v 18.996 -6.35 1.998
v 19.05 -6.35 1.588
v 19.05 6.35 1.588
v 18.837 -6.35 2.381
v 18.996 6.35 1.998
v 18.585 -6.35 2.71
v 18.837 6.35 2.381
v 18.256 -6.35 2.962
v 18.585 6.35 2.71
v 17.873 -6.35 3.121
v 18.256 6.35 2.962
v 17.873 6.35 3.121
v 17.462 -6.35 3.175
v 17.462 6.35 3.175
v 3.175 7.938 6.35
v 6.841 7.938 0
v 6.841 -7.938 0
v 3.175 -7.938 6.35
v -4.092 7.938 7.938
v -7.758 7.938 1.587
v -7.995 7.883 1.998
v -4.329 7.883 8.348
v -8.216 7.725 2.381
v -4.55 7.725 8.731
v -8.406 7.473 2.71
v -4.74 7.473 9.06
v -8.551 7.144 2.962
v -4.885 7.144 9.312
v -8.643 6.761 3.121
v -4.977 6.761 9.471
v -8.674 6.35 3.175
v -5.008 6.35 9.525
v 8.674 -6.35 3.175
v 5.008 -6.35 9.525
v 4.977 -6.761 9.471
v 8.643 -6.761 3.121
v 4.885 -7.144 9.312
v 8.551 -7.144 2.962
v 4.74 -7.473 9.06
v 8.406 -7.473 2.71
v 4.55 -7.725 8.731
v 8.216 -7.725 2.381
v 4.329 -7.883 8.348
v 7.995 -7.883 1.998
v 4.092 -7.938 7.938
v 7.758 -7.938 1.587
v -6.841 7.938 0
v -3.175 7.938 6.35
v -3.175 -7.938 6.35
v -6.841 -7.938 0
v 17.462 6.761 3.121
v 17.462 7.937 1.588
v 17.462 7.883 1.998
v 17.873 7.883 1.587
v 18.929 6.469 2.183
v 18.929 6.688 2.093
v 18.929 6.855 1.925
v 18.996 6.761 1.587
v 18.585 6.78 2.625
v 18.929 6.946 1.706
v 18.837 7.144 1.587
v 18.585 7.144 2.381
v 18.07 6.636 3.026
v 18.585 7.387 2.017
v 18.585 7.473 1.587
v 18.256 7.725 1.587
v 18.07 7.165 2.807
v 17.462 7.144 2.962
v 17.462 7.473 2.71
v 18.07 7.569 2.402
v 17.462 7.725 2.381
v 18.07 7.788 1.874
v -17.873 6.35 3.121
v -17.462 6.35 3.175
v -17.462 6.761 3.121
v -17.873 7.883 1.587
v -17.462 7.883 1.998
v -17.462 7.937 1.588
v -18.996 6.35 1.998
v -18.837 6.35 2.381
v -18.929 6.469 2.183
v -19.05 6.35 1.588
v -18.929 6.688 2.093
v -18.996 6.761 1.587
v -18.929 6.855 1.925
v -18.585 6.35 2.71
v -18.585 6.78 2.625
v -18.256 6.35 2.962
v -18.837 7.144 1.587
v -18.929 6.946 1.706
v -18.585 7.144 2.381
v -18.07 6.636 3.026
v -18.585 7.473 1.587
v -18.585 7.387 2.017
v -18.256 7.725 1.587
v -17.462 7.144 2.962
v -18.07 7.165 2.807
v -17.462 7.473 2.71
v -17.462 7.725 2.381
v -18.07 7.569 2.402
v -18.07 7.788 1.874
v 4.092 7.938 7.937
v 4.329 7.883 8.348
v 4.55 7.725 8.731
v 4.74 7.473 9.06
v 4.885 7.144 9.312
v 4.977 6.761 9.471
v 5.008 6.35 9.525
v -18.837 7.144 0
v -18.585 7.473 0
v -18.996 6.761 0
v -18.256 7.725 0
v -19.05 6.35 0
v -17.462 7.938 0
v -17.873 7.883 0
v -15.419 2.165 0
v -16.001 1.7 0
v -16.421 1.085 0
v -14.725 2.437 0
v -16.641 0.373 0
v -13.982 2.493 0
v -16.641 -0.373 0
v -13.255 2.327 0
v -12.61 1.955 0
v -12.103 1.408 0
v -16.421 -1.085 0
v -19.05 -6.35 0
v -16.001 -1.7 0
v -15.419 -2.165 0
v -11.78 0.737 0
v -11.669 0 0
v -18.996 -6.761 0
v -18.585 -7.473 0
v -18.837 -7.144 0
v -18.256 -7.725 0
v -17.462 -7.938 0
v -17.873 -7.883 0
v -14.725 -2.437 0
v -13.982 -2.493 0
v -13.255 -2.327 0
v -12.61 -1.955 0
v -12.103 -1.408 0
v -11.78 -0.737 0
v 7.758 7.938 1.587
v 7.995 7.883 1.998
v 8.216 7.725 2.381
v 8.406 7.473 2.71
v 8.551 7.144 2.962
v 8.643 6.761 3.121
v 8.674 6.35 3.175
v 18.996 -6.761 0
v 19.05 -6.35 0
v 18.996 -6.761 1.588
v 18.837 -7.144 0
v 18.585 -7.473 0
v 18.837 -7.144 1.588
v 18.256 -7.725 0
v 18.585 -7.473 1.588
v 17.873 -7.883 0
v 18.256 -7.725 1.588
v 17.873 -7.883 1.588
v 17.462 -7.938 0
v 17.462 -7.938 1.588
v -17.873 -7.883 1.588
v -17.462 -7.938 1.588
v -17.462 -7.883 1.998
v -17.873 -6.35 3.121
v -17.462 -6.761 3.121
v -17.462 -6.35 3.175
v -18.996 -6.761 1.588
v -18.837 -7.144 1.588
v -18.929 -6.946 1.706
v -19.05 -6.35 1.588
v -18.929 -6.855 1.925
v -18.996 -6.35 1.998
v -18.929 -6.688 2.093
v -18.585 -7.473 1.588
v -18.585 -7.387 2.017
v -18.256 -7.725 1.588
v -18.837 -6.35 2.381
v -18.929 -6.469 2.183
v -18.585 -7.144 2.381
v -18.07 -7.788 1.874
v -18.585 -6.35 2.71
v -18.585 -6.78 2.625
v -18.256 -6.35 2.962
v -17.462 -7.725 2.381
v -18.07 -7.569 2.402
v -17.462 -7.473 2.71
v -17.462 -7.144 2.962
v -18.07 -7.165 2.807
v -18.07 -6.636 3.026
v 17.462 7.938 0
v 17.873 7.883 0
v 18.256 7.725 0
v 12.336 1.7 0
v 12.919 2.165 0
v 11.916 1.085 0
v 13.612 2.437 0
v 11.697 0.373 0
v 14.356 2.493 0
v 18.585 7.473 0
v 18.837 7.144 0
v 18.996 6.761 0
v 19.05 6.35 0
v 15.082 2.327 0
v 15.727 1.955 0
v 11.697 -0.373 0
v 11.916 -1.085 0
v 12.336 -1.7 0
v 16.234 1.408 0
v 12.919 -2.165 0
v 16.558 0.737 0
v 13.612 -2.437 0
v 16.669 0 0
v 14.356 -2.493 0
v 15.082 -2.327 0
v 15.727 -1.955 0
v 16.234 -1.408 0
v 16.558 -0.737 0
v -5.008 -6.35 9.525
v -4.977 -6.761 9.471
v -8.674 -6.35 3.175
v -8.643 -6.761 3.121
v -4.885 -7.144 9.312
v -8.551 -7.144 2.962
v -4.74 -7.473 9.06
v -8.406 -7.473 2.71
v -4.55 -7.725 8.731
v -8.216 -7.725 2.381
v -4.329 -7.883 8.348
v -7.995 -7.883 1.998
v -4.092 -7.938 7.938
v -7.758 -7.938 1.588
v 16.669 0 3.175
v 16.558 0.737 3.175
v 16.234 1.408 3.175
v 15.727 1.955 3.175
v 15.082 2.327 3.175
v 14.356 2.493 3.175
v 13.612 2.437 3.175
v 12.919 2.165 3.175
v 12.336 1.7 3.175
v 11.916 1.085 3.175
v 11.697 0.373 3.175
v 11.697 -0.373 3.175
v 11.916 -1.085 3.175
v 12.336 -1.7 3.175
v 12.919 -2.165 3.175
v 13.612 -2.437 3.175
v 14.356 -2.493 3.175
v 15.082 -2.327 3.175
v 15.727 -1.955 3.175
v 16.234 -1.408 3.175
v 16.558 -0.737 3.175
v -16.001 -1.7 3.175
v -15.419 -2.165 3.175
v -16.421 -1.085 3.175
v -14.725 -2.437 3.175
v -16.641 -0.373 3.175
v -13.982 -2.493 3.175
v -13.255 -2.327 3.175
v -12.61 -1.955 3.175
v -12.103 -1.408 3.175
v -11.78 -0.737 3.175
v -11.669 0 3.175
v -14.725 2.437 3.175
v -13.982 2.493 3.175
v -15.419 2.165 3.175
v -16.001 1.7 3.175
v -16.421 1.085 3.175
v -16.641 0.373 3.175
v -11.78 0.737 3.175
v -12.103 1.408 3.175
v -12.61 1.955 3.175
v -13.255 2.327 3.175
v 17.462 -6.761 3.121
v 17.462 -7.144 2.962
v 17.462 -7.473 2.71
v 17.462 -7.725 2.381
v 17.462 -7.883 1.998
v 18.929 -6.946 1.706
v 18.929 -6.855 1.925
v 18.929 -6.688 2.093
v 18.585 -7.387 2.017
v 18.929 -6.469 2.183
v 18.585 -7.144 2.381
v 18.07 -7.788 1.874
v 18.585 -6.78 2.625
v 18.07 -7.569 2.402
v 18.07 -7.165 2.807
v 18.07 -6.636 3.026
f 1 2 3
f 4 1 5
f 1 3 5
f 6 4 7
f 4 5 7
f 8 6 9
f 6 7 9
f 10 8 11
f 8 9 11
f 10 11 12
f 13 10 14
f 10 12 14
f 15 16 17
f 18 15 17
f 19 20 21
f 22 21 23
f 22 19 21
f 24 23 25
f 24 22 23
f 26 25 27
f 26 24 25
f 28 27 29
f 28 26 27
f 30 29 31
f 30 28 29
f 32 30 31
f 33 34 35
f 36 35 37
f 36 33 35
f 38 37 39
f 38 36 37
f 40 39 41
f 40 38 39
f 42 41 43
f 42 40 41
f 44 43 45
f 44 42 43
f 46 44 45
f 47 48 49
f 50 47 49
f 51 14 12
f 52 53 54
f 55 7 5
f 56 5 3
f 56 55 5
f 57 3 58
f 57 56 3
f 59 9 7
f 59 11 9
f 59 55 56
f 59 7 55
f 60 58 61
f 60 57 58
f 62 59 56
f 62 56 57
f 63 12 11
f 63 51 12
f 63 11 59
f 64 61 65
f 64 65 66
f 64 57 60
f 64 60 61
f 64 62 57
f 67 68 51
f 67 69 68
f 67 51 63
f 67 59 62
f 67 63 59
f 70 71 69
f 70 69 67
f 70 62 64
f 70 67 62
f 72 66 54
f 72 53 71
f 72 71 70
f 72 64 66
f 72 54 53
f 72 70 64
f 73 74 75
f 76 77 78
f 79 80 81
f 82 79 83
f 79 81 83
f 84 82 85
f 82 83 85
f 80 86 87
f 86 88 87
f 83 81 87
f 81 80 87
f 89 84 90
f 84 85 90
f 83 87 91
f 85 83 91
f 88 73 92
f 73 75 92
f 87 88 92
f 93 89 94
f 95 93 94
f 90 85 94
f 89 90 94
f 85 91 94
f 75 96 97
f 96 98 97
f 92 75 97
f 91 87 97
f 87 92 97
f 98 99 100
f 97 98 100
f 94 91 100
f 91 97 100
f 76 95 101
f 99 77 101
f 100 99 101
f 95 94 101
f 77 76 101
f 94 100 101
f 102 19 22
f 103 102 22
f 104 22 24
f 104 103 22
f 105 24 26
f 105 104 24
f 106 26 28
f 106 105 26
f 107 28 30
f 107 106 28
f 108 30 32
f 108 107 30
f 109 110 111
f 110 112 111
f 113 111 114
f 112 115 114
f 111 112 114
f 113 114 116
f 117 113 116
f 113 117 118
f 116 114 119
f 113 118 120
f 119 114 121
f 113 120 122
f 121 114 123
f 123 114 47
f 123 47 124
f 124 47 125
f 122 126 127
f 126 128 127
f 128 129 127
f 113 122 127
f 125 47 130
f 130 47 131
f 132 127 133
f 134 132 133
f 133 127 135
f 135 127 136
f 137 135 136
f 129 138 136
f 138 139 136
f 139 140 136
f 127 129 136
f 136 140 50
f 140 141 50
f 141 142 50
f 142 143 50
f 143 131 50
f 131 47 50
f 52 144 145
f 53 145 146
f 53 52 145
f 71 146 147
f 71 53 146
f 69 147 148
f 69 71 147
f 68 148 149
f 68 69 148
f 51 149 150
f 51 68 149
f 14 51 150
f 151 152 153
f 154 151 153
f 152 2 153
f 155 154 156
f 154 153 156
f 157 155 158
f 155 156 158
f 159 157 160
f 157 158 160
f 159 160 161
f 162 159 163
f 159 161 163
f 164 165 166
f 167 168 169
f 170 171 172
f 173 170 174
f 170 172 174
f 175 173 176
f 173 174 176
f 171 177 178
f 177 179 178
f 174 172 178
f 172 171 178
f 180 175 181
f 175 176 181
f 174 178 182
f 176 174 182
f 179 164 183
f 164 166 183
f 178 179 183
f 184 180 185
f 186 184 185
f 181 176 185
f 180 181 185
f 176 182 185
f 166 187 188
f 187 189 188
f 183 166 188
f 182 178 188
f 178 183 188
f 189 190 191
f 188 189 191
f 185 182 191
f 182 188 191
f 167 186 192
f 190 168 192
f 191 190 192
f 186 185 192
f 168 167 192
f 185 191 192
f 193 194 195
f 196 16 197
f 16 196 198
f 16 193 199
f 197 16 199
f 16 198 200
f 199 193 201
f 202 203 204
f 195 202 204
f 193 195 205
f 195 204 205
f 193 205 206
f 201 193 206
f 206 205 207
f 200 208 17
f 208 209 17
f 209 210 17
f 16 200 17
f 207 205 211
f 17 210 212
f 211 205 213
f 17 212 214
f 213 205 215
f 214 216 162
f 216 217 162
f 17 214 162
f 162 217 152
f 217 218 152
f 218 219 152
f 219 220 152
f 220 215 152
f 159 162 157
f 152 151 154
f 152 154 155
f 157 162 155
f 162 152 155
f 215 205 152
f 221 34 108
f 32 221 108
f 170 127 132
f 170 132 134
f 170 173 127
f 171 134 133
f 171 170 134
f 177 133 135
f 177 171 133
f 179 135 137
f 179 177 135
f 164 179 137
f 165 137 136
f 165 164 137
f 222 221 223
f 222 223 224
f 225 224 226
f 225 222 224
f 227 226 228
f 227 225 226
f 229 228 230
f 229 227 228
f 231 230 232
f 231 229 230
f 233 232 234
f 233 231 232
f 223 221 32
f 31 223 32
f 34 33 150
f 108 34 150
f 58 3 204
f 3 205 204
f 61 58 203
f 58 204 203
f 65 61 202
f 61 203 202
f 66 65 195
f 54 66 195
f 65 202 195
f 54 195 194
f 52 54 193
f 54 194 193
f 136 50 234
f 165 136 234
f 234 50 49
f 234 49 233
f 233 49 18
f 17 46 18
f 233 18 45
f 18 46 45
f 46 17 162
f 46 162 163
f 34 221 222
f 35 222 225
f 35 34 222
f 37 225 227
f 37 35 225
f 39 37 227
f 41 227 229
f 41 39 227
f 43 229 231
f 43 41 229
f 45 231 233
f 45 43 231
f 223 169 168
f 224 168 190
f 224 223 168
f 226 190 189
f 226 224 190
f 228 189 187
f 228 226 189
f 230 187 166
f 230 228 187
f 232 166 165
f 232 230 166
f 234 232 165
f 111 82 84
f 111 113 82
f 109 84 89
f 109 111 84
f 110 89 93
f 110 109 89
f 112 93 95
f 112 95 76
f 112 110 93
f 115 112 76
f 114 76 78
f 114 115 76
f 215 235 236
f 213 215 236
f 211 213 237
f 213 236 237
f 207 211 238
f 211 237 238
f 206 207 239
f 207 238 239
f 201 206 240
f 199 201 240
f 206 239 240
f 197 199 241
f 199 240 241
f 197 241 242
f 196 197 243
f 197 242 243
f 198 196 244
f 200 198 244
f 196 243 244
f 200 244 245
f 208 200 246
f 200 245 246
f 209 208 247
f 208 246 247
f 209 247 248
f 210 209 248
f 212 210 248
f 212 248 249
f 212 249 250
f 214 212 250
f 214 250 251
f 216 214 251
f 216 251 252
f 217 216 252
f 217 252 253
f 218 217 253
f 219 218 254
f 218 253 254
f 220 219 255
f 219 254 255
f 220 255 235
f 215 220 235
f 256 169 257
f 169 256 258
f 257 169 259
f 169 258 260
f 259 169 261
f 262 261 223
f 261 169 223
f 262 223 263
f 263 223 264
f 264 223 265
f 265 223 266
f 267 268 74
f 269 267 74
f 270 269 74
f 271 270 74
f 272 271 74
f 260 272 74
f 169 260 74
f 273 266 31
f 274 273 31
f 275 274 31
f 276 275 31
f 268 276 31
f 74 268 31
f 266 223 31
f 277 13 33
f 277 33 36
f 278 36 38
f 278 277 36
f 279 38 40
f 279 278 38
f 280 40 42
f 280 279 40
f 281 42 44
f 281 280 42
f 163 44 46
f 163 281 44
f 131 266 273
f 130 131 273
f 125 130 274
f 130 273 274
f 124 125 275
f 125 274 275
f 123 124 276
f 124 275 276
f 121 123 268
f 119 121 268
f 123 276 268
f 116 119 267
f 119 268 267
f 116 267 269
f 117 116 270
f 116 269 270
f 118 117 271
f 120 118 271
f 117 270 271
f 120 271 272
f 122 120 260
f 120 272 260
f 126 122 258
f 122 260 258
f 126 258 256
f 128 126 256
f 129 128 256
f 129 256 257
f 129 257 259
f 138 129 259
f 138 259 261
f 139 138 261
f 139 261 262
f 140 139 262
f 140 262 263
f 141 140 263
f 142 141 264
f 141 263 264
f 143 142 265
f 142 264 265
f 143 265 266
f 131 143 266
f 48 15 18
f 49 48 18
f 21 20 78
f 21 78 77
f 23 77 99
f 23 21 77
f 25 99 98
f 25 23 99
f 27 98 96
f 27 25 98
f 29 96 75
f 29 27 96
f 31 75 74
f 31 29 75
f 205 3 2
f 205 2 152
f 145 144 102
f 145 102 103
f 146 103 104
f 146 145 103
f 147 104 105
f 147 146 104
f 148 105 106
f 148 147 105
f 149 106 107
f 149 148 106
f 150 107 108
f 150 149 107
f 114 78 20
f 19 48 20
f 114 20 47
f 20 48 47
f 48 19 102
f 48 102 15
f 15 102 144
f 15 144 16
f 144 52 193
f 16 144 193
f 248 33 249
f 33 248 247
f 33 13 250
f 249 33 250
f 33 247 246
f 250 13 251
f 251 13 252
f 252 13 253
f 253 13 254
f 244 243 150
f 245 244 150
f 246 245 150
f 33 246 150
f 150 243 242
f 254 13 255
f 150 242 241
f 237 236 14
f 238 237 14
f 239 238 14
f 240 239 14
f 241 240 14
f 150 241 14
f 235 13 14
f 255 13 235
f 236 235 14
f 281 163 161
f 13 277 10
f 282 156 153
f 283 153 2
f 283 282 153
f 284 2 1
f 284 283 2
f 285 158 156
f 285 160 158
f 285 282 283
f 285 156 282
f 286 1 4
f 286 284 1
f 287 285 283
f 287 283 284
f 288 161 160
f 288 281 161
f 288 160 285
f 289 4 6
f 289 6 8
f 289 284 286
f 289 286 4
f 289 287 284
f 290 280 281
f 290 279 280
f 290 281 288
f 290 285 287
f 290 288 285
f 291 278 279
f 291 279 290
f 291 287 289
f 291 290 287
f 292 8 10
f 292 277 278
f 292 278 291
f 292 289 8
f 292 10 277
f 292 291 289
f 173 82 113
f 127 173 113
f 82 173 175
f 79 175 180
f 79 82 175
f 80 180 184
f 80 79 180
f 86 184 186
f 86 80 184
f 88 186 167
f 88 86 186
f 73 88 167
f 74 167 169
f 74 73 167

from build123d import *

# Parameters (mm, degrees)
F4_R     = 2.5
F5_DEPTH = 3.175
F6_R     = 1.5875


with BuildPart() as f3:
    # F3: sweep along a path in F0
    with BuildLine(Plane.XZ) as f3_path:
        Line((-19.05, 0), (-6.8411742094, 0))
        Line((-6.8411742094, 0), (-3.175, 6.35))
        Line((-3.175, 6.35), (0, 6.35))
        Line((0, 6.35), (3.175, 6.35))
        Line((3.175, 6.35), (6.8411742094, 0))
        Line((6.8411742094, 0), (19.05, 0))
    # F2 (on line) → F3 (sweep)
    with BuildSketch(Plane(origin=(-19.05, 0, 0), x_dir=(0, -1, 0), z_dir=(-1, 0, 0))):
        with BuildLine():
            Line((-7.9375, 0), (7.9375, 0))
            Line((7.9375, 0), (7.9375, 1.5875))
            ThreePointArc((7.9375, 1.5875), (7.4725320151, 2.7100320151), (6.35, 3.175))
            Line((6.35, 3.175), (-6.35, 3.175))
            ThreePointArc((-6.35, 3.175), (-7.4725320151, 2.7100320151), (-7.9375, 1.5875))
            Line((-7.9375, 1.5875), (-7.9375, 0))
        make_face()
    sweep(path=f3_path.line, transition=Transition.RIGHT)

    # F4 (on face) → F5 (cut, through all)
    with BuildSketch(Plane.XY.offset(3.175)):
        with Locations((-14.16875, 0)):
            Circle(F4_R)
        with Locations((14.16875, 0)):
            Circle(F4_R)
    extrude(amount=-F5_DEPTH, mode=Mode.SUBTRACT)

    # F6
    f6_edges = [f3.edges().sort_by_distance(p)[0] for p in [
        (-19.05, 0, 3.175),
        (19.05, 0, 3.175),
    ]]
    fillet(f6_edges, radius=F6_R)


solid = f3.part
